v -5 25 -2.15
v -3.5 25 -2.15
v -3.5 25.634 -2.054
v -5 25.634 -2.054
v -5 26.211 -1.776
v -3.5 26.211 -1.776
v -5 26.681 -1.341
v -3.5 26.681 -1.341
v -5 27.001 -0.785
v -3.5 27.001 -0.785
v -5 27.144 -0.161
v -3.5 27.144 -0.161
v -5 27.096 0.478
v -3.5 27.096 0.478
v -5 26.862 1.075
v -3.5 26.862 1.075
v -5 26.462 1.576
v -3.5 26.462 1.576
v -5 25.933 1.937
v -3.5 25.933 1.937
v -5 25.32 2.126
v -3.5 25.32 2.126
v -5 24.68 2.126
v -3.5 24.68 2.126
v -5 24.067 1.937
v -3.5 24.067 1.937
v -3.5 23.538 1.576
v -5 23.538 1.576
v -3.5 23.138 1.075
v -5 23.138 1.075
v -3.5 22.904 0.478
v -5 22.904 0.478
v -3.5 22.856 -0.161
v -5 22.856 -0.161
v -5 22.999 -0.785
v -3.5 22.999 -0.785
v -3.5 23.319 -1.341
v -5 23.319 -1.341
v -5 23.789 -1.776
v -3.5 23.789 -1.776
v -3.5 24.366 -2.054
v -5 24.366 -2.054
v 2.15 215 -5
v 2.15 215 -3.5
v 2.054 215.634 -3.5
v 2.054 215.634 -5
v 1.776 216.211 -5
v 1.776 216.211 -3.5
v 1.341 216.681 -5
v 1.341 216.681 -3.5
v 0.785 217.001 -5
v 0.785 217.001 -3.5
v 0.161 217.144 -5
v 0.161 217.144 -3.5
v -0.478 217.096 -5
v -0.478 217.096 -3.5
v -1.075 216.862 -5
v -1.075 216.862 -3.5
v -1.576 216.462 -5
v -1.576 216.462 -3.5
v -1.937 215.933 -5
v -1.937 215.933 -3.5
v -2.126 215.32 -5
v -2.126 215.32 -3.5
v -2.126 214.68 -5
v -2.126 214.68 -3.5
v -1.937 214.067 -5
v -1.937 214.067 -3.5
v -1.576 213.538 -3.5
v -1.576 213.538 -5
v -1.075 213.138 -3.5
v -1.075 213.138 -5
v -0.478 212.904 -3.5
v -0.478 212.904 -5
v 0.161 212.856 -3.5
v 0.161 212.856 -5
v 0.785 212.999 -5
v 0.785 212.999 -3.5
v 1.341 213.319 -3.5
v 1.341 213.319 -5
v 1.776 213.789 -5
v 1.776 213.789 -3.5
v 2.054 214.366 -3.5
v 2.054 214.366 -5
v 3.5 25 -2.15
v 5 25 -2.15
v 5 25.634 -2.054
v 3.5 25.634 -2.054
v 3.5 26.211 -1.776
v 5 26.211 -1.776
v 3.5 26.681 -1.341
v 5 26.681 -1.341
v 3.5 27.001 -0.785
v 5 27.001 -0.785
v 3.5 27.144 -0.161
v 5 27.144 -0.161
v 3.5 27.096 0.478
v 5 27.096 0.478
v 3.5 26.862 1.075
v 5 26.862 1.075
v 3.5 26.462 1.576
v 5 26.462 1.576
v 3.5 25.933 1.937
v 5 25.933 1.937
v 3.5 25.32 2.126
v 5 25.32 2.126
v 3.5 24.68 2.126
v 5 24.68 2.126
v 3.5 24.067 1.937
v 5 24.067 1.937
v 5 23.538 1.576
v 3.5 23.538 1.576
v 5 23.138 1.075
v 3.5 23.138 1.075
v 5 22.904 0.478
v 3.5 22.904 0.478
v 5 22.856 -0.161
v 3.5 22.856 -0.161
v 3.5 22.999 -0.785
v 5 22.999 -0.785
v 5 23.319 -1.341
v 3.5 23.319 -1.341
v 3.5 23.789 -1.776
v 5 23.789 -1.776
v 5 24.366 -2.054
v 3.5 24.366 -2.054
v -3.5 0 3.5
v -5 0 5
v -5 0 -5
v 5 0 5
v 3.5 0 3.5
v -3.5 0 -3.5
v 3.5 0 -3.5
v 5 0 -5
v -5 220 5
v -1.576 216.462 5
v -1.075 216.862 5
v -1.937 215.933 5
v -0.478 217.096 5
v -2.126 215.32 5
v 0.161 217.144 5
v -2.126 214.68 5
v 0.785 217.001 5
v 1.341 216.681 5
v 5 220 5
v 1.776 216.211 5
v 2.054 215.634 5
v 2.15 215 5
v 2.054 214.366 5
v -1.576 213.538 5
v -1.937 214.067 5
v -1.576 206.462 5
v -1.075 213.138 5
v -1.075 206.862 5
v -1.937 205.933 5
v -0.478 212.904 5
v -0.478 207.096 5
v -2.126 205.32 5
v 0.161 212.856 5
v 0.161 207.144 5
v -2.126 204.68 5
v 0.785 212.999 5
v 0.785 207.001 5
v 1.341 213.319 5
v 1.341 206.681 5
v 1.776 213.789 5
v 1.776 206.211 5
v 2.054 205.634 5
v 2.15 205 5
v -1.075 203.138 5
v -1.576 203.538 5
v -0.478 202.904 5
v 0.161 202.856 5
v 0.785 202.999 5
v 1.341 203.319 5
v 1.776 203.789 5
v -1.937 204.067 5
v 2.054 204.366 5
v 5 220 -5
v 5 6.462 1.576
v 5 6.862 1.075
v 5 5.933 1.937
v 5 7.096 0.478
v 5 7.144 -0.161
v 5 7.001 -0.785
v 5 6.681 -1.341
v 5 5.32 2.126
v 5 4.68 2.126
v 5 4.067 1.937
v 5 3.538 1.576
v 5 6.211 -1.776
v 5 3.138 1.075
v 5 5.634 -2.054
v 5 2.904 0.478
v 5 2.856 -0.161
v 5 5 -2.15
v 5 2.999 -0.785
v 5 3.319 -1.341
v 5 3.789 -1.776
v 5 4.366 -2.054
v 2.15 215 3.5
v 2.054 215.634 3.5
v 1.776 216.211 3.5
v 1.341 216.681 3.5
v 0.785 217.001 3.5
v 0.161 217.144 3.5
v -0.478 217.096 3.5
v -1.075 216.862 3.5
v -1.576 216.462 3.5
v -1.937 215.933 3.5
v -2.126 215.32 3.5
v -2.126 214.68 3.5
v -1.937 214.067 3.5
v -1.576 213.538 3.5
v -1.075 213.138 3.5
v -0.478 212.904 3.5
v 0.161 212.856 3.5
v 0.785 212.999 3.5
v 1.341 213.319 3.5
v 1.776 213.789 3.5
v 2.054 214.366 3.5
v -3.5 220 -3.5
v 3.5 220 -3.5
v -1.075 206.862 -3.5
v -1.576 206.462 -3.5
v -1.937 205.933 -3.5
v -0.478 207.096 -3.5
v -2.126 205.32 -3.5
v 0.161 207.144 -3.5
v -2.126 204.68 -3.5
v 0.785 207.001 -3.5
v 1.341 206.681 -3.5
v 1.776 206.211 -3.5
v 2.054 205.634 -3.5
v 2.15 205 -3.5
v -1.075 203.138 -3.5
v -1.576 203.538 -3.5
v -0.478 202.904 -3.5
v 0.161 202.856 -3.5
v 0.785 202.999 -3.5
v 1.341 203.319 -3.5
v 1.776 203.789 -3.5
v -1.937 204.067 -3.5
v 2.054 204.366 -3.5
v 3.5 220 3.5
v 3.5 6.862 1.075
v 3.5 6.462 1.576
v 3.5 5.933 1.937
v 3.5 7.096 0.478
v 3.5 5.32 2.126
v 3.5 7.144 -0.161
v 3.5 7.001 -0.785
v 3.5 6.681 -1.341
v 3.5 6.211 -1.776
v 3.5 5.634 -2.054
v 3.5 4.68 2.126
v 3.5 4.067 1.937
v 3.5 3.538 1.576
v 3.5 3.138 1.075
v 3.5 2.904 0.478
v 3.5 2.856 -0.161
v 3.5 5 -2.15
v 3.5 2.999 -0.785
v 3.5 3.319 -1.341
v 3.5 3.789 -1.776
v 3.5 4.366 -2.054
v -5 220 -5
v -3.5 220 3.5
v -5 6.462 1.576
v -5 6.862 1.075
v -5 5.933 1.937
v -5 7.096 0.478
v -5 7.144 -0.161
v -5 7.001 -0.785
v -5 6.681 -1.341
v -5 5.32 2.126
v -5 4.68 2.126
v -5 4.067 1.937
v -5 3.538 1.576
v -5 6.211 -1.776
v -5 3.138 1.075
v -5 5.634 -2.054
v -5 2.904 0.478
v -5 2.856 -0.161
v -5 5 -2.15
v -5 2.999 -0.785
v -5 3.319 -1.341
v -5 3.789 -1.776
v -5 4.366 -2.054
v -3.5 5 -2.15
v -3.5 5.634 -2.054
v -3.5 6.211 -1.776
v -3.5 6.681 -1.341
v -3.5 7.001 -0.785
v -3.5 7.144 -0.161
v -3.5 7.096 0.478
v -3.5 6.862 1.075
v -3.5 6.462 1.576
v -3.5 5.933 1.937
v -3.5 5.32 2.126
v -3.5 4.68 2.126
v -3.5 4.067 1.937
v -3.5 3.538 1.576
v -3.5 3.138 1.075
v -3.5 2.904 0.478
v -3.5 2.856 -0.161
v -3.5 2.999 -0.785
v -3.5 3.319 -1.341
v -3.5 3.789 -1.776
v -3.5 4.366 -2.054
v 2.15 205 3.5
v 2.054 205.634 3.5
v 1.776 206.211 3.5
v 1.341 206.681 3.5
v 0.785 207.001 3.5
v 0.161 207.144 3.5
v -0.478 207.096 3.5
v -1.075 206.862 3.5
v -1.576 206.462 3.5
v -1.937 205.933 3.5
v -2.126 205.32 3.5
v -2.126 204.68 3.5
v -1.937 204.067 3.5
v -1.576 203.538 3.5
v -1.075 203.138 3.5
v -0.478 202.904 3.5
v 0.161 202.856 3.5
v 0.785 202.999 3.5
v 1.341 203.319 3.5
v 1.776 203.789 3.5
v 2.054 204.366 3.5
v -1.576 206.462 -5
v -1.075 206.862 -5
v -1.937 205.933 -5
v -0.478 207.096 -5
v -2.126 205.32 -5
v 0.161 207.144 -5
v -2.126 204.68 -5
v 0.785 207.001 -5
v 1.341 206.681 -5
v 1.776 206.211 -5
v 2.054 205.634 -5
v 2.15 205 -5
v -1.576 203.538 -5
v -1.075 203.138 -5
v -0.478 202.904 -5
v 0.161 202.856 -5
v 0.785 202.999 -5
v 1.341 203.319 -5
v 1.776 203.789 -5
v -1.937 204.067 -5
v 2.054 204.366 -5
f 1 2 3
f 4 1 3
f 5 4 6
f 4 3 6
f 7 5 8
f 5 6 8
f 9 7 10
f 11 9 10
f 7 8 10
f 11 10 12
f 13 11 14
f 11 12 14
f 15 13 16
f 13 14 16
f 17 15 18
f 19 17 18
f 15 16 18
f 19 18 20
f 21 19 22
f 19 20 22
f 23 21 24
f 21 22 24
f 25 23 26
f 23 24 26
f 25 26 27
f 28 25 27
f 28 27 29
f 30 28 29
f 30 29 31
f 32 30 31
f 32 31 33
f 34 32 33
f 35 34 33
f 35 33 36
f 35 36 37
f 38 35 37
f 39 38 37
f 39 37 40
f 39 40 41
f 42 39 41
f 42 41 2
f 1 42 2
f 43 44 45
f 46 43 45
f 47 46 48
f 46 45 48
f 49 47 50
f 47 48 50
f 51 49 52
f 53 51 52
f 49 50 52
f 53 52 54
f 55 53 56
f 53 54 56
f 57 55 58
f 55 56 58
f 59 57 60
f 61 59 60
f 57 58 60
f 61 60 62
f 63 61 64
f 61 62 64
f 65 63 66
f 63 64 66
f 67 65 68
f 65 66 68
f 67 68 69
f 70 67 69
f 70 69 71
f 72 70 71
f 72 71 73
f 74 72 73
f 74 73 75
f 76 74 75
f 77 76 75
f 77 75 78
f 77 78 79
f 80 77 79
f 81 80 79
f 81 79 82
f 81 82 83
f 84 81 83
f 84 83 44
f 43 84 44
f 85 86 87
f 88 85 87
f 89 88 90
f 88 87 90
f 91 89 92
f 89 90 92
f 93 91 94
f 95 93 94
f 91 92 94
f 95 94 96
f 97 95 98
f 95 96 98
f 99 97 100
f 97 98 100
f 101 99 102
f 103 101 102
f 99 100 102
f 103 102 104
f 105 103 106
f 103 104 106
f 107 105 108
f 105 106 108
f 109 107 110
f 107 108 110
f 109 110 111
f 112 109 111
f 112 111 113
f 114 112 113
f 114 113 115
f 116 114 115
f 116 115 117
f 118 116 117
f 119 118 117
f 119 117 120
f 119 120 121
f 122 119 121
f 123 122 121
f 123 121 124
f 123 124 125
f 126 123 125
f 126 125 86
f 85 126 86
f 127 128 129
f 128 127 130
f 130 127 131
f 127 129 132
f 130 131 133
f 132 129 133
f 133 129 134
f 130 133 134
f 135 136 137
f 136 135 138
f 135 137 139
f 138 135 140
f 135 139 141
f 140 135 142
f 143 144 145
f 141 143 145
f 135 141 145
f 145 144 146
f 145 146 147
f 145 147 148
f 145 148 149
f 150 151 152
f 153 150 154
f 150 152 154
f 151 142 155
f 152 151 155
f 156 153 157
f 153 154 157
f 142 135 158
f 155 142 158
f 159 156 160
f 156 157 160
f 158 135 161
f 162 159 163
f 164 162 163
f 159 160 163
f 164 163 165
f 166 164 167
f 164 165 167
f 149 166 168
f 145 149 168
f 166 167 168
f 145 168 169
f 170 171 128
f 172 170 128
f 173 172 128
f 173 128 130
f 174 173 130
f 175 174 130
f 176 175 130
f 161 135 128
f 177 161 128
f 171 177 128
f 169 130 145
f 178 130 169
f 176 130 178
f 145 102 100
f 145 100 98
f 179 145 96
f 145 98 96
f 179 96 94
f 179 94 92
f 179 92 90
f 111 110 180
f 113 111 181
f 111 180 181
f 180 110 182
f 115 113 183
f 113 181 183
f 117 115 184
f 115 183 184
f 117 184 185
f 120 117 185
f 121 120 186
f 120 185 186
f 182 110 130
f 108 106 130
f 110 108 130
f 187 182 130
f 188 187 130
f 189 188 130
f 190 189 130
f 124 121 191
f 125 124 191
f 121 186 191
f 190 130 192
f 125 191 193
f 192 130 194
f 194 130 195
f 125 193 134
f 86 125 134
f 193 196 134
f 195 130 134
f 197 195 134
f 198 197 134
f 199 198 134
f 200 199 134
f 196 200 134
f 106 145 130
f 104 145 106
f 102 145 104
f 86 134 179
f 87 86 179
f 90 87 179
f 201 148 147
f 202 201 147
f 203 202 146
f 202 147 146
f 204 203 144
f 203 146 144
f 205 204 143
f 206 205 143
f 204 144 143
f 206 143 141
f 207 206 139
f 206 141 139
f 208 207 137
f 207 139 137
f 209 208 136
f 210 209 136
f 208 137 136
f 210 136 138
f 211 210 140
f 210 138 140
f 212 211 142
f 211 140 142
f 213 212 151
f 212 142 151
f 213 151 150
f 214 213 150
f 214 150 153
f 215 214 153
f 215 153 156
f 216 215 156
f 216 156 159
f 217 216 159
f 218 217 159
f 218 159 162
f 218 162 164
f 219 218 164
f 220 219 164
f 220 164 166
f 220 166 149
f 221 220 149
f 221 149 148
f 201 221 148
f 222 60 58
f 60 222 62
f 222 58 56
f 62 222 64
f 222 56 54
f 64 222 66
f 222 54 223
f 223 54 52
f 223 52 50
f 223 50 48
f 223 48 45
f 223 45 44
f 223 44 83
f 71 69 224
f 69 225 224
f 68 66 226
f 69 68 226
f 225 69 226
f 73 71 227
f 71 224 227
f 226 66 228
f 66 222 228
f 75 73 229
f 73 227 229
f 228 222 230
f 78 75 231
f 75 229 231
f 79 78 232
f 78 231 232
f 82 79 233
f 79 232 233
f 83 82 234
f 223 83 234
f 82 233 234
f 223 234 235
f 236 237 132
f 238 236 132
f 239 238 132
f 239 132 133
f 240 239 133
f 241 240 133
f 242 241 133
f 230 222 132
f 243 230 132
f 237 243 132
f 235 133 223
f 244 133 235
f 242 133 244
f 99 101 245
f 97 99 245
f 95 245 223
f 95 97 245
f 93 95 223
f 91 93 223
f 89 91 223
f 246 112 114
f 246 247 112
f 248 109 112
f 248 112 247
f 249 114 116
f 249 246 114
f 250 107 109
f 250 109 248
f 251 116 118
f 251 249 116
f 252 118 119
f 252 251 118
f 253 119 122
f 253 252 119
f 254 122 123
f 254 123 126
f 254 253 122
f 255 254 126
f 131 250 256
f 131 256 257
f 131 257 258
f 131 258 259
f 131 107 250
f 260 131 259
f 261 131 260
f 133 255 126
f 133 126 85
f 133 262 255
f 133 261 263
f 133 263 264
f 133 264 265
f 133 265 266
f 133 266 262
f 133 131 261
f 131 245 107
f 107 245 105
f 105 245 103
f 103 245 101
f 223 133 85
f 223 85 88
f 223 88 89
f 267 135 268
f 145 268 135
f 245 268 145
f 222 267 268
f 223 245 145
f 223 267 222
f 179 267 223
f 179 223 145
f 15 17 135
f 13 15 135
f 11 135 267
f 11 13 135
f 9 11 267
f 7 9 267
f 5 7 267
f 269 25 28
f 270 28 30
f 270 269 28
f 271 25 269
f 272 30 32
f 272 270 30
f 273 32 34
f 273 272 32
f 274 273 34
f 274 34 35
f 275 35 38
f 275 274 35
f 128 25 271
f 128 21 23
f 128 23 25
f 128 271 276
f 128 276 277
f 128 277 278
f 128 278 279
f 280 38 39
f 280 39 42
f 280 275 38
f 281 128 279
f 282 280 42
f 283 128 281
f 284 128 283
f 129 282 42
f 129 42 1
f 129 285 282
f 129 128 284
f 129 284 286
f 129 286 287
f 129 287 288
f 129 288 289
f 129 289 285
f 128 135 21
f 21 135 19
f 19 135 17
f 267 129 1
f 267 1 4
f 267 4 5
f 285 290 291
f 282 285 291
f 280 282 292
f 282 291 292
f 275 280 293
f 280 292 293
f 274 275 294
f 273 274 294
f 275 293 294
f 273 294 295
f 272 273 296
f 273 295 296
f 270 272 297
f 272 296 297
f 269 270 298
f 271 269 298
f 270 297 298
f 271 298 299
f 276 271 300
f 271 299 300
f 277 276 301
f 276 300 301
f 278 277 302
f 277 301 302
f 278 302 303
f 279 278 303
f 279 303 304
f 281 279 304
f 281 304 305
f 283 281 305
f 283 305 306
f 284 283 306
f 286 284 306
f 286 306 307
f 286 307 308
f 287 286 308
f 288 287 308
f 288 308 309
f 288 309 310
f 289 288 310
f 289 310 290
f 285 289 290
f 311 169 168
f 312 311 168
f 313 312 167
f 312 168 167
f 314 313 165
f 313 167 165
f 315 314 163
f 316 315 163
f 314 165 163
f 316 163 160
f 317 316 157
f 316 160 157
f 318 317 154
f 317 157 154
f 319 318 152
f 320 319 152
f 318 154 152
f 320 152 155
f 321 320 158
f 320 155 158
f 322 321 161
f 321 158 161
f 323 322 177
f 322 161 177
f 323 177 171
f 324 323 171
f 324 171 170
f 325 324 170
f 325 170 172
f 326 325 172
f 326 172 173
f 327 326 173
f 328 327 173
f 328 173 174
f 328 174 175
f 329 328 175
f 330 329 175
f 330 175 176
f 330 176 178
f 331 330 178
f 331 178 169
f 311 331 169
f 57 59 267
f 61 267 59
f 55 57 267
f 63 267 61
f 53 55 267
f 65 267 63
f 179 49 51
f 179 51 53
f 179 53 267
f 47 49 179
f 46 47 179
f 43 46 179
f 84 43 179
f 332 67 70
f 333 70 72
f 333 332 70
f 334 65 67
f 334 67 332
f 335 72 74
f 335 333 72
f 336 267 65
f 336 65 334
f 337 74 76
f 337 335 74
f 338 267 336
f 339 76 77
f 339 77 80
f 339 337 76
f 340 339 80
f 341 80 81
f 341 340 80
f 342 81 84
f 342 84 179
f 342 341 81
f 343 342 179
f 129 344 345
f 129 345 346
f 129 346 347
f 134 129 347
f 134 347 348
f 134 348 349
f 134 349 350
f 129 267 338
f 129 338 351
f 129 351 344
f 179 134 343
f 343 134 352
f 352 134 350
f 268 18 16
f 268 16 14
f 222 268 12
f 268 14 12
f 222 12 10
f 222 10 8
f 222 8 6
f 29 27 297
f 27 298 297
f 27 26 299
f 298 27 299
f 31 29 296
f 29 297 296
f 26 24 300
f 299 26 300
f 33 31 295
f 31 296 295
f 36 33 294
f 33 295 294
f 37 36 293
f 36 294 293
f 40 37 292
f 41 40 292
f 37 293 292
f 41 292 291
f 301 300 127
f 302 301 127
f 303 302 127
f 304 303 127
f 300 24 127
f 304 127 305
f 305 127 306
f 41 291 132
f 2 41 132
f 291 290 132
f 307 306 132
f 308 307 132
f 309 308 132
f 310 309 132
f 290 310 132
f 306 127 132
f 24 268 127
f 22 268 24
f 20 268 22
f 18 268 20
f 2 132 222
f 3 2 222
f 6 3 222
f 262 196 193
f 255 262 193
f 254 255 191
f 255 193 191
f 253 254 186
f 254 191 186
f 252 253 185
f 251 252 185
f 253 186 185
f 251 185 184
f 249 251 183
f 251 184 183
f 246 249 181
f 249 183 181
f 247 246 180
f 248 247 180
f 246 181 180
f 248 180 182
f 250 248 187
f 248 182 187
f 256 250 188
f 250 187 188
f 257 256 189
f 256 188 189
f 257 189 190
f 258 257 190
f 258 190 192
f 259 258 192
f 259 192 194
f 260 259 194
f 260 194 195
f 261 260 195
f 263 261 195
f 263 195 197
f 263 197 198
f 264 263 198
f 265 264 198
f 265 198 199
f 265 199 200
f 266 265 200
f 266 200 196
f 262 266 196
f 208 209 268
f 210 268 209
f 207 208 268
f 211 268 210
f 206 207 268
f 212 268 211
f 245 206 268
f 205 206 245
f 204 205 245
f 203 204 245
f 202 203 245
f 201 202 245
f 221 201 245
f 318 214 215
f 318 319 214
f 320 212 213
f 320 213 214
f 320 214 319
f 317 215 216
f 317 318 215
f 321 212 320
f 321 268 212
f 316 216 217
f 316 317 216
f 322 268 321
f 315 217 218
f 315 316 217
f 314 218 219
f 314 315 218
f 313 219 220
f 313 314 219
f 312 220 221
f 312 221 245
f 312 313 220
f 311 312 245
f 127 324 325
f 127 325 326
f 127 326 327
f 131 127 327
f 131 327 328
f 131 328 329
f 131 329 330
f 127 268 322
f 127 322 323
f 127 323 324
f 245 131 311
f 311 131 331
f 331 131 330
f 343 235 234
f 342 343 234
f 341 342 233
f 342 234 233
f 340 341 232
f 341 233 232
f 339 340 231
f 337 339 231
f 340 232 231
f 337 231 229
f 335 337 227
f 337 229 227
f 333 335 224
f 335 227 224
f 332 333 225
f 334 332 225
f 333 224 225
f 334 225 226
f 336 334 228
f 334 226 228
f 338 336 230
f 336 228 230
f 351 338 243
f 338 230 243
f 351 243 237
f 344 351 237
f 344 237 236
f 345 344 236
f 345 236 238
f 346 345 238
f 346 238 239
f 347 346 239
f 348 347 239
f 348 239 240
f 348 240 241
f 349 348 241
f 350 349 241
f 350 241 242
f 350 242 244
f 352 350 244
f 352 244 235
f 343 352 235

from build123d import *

# Parameters (mm, degrees)
SKETCH_1_W          = 10
SKETCH_1_H          = 10
SKETCH_1_W_2        = 7
SKETCH_1_H_2        = 7
EXTRUDE_1_DEPTH     = 220
SKETCH_2_R          = 2.15
CUT_EXTRUDE_1_DEPTH = 221.283907719
SKETCH_3_R          = 2.15
CUT_EXTRUDE_2_DEPTH = 221.283907719


with BuildPart() as part:
    # ｽｹｯﾁ1 → 押し出し-薄板1 (new body)
    with BuildSketch(Plane(origin=(0, 0, 0), x_dir=(1, 0, 0), z_dir=(0, 1, 0))):
        Rectangle(SKETCH_1_W, SKETCH_1_H)
        Rectangle(SKETCH_1_W_2, SKETCH_1_H_2, mode=Mode.SUBTRACT)
    extrude(amount=EXTRUDE_1_DEPTH)

    # ｽｹｯﾁ2 → ｶｯﾄ - 押し出し1 (cut, through all)
    with BuildSketch(Plane.XY.offset(5)):
        with Locations((0, 205)):
            Circle(SKETCH_2_R)
        with Locations((0, 215)):
            Circle(SKETCH_2_R)
    extrude(amount=-CUT_EXTRUDE_1_DEPTH, mode=Mode.SUBTRACT)

    # ｽｹｯﾁ3 → ｶｯﾄ - 押し出し2 (cut, through all)
    with BuildSketch(Plane(origin=(5, 0, 0), x_dir=(0, 0, -1), z_dir=(1, 0, 0))):
        with Locations((0, 5)):
            Circle(SKETCH_3_R)
        with Locations((0, 25)):
            Circle(SKETCH_3_R)
    extrude(amount=-CUT_EXTRUDE_2_DEPTH, mode=Mode.SUBTRACT)


solid = part.part
